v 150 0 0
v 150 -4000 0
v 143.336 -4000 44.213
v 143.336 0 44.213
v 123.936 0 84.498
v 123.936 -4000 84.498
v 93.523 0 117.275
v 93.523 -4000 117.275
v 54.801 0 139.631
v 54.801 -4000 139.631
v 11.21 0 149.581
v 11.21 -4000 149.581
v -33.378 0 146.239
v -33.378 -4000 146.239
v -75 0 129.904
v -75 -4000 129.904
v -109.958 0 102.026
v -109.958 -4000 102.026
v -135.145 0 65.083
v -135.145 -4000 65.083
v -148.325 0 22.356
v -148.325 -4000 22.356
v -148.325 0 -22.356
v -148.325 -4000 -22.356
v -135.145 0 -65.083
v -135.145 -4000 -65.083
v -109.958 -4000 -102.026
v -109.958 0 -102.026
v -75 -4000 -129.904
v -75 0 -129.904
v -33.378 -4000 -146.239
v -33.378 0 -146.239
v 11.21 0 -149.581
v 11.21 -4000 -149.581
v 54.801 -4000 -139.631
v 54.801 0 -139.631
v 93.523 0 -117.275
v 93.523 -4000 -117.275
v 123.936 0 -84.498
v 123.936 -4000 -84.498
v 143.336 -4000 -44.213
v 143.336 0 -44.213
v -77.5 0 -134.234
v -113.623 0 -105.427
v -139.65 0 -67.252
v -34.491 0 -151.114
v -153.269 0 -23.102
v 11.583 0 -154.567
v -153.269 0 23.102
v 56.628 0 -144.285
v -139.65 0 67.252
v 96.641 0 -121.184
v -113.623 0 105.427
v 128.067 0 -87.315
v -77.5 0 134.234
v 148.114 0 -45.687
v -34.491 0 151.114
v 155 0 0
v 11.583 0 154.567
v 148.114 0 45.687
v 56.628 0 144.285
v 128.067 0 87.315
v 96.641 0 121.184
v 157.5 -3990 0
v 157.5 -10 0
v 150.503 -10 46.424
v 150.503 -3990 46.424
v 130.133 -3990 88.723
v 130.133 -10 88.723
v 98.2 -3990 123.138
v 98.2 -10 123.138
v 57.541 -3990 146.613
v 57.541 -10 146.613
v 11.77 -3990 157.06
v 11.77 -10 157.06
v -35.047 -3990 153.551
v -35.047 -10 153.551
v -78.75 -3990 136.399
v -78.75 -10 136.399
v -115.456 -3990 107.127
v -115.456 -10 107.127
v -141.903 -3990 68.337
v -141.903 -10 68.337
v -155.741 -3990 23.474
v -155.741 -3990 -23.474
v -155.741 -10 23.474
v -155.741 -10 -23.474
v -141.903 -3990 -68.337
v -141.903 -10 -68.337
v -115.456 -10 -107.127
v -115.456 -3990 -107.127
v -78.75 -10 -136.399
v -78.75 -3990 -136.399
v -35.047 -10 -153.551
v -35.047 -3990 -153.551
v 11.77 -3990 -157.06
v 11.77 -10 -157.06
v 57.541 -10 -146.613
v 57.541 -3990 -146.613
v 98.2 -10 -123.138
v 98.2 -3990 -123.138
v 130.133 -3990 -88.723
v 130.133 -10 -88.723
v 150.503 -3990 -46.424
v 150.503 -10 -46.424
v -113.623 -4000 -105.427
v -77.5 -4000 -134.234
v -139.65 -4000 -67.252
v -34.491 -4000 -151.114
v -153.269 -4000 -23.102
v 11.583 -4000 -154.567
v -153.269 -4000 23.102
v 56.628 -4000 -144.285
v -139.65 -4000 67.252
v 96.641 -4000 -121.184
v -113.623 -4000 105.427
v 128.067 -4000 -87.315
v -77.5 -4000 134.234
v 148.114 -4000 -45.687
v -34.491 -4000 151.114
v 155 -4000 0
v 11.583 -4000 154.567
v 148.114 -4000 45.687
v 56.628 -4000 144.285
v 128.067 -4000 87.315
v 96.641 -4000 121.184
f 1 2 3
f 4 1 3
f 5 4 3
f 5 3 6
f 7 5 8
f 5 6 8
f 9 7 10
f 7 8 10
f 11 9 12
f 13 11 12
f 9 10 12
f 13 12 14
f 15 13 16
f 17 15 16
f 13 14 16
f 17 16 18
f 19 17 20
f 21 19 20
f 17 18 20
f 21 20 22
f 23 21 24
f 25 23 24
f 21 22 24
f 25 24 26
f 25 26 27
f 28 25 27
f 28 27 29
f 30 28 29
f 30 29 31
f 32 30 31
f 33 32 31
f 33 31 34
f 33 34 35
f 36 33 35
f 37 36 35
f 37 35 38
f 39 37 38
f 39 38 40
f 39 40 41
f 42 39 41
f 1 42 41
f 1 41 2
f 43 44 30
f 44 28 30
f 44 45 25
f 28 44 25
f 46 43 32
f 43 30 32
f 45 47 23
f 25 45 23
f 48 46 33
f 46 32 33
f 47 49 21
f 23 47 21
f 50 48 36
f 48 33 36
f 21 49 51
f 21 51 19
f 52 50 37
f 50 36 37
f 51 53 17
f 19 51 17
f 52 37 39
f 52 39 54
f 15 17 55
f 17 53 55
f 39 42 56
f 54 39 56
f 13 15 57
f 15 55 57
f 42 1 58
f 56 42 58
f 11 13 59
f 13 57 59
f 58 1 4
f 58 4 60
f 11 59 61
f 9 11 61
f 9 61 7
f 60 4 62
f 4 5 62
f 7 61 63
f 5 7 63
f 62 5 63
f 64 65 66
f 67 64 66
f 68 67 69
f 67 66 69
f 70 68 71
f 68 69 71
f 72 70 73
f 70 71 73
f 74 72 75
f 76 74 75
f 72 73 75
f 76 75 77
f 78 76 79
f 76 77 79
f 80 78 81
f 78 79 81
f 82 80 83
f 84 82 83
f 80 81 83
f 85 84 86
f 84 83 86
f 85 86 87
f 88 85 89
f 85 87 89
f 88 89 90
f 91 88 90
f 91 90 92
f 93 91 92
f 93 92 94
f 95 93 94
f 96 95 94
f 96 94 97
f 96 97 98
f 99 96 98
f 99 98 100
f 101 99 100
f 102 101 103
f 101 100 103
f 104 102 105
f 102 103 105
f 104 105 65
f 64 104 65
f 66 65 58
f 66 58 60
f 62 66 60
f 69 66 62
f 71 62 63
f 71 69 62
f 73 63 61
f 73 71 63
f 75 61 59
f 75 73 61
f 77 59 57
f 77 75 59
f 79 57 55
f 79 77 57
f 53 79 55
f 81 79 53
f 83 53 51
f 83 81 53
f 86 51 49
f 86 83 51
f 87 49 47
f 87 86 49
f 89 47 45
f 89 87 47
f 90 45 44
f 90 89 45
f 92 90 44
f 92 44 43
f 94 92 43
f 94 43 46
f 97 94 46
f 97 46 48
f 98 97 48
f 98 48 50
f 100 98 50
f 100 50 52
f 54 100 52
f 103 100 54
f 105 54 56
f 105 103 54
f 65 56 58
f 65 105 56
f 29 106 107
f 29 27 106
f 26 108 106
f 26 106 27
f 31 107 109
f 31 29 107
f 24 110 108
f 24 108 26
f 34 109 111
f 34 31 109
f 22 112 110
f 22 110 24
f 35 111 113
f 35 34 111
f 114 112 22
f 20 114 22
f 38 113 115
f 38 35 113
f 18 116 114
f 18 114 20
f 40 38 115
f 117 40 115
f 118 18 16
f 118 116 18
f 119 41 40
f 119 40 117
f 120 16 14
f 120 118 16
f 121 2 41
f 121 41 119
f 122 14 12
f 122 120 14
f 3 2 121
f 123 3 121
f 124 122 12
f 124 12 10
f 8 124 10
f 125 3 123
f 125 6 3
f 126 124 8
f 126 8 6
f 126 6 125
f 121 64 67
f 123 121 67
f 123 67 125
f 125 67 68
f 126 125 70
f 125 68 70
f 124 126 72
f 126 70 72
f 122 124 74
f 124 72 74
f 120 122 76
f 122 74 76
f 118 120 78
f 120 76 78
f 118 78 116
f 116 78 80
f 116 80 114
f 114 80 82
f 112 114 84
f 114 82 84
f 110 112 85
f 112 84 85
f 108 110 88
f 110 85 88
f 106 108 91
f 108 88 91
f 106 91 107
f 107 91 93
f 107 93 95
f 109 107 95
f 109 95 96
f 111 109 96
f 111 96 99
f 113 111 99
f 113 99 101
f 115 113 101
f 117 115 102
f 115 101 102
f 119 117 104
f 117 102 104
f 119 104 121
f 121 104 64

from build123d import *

# Parameters (mm, degrees)
F0_R     = 157.5
F1_DEPTH = 4000
F2_R     = 150
F3_DEPTH = 4000.001
F4_SIZE2 = 10
F4_SIZE  = 2.5
F5_SIZE2 = 10
F5_SIZE  = 2.5


with BuildPart() as f1:
    # F0 (on Front) → F1 (new body)
    with BuildSketch(Plane.XZ):
        Circle(F0_R)
    extrude(amount=F1_DEPTH)

    # F2 (on face) → F3 (cut, through all)
    with BuildSketch(Plane.XZ.offset(4000)):
        Circle(F2_R)
    extrude(amount=-F3_DEPTH, mode=Mode.SUBTRACT)

    # F4
    f4_edges = [f1.edges().sort_by_distance(p)[0] for p in [
        (-157.5, -4000, 0),
    ]]
    f4_side = f1.faces().sort_by_distance((-153.045227, -4000, 0))[0]
    chamfer(f4_edges, length=F4_SIZE, length2=F4_SIZE2, reference=f4_side)

    # F5
    f5_edges = [f1.edges().sort_by_distance(p)[0] for p in [
        (-157.5, 0, 0),
    ]]
    f5_side = f1.faces().sort_by_distance((-153.045227, 0, 0))[0]
    chamfer(f5_edges, length=F5_SIZE, length2=F5_SIZE2, reference=f5_side)


solid = f1.part
